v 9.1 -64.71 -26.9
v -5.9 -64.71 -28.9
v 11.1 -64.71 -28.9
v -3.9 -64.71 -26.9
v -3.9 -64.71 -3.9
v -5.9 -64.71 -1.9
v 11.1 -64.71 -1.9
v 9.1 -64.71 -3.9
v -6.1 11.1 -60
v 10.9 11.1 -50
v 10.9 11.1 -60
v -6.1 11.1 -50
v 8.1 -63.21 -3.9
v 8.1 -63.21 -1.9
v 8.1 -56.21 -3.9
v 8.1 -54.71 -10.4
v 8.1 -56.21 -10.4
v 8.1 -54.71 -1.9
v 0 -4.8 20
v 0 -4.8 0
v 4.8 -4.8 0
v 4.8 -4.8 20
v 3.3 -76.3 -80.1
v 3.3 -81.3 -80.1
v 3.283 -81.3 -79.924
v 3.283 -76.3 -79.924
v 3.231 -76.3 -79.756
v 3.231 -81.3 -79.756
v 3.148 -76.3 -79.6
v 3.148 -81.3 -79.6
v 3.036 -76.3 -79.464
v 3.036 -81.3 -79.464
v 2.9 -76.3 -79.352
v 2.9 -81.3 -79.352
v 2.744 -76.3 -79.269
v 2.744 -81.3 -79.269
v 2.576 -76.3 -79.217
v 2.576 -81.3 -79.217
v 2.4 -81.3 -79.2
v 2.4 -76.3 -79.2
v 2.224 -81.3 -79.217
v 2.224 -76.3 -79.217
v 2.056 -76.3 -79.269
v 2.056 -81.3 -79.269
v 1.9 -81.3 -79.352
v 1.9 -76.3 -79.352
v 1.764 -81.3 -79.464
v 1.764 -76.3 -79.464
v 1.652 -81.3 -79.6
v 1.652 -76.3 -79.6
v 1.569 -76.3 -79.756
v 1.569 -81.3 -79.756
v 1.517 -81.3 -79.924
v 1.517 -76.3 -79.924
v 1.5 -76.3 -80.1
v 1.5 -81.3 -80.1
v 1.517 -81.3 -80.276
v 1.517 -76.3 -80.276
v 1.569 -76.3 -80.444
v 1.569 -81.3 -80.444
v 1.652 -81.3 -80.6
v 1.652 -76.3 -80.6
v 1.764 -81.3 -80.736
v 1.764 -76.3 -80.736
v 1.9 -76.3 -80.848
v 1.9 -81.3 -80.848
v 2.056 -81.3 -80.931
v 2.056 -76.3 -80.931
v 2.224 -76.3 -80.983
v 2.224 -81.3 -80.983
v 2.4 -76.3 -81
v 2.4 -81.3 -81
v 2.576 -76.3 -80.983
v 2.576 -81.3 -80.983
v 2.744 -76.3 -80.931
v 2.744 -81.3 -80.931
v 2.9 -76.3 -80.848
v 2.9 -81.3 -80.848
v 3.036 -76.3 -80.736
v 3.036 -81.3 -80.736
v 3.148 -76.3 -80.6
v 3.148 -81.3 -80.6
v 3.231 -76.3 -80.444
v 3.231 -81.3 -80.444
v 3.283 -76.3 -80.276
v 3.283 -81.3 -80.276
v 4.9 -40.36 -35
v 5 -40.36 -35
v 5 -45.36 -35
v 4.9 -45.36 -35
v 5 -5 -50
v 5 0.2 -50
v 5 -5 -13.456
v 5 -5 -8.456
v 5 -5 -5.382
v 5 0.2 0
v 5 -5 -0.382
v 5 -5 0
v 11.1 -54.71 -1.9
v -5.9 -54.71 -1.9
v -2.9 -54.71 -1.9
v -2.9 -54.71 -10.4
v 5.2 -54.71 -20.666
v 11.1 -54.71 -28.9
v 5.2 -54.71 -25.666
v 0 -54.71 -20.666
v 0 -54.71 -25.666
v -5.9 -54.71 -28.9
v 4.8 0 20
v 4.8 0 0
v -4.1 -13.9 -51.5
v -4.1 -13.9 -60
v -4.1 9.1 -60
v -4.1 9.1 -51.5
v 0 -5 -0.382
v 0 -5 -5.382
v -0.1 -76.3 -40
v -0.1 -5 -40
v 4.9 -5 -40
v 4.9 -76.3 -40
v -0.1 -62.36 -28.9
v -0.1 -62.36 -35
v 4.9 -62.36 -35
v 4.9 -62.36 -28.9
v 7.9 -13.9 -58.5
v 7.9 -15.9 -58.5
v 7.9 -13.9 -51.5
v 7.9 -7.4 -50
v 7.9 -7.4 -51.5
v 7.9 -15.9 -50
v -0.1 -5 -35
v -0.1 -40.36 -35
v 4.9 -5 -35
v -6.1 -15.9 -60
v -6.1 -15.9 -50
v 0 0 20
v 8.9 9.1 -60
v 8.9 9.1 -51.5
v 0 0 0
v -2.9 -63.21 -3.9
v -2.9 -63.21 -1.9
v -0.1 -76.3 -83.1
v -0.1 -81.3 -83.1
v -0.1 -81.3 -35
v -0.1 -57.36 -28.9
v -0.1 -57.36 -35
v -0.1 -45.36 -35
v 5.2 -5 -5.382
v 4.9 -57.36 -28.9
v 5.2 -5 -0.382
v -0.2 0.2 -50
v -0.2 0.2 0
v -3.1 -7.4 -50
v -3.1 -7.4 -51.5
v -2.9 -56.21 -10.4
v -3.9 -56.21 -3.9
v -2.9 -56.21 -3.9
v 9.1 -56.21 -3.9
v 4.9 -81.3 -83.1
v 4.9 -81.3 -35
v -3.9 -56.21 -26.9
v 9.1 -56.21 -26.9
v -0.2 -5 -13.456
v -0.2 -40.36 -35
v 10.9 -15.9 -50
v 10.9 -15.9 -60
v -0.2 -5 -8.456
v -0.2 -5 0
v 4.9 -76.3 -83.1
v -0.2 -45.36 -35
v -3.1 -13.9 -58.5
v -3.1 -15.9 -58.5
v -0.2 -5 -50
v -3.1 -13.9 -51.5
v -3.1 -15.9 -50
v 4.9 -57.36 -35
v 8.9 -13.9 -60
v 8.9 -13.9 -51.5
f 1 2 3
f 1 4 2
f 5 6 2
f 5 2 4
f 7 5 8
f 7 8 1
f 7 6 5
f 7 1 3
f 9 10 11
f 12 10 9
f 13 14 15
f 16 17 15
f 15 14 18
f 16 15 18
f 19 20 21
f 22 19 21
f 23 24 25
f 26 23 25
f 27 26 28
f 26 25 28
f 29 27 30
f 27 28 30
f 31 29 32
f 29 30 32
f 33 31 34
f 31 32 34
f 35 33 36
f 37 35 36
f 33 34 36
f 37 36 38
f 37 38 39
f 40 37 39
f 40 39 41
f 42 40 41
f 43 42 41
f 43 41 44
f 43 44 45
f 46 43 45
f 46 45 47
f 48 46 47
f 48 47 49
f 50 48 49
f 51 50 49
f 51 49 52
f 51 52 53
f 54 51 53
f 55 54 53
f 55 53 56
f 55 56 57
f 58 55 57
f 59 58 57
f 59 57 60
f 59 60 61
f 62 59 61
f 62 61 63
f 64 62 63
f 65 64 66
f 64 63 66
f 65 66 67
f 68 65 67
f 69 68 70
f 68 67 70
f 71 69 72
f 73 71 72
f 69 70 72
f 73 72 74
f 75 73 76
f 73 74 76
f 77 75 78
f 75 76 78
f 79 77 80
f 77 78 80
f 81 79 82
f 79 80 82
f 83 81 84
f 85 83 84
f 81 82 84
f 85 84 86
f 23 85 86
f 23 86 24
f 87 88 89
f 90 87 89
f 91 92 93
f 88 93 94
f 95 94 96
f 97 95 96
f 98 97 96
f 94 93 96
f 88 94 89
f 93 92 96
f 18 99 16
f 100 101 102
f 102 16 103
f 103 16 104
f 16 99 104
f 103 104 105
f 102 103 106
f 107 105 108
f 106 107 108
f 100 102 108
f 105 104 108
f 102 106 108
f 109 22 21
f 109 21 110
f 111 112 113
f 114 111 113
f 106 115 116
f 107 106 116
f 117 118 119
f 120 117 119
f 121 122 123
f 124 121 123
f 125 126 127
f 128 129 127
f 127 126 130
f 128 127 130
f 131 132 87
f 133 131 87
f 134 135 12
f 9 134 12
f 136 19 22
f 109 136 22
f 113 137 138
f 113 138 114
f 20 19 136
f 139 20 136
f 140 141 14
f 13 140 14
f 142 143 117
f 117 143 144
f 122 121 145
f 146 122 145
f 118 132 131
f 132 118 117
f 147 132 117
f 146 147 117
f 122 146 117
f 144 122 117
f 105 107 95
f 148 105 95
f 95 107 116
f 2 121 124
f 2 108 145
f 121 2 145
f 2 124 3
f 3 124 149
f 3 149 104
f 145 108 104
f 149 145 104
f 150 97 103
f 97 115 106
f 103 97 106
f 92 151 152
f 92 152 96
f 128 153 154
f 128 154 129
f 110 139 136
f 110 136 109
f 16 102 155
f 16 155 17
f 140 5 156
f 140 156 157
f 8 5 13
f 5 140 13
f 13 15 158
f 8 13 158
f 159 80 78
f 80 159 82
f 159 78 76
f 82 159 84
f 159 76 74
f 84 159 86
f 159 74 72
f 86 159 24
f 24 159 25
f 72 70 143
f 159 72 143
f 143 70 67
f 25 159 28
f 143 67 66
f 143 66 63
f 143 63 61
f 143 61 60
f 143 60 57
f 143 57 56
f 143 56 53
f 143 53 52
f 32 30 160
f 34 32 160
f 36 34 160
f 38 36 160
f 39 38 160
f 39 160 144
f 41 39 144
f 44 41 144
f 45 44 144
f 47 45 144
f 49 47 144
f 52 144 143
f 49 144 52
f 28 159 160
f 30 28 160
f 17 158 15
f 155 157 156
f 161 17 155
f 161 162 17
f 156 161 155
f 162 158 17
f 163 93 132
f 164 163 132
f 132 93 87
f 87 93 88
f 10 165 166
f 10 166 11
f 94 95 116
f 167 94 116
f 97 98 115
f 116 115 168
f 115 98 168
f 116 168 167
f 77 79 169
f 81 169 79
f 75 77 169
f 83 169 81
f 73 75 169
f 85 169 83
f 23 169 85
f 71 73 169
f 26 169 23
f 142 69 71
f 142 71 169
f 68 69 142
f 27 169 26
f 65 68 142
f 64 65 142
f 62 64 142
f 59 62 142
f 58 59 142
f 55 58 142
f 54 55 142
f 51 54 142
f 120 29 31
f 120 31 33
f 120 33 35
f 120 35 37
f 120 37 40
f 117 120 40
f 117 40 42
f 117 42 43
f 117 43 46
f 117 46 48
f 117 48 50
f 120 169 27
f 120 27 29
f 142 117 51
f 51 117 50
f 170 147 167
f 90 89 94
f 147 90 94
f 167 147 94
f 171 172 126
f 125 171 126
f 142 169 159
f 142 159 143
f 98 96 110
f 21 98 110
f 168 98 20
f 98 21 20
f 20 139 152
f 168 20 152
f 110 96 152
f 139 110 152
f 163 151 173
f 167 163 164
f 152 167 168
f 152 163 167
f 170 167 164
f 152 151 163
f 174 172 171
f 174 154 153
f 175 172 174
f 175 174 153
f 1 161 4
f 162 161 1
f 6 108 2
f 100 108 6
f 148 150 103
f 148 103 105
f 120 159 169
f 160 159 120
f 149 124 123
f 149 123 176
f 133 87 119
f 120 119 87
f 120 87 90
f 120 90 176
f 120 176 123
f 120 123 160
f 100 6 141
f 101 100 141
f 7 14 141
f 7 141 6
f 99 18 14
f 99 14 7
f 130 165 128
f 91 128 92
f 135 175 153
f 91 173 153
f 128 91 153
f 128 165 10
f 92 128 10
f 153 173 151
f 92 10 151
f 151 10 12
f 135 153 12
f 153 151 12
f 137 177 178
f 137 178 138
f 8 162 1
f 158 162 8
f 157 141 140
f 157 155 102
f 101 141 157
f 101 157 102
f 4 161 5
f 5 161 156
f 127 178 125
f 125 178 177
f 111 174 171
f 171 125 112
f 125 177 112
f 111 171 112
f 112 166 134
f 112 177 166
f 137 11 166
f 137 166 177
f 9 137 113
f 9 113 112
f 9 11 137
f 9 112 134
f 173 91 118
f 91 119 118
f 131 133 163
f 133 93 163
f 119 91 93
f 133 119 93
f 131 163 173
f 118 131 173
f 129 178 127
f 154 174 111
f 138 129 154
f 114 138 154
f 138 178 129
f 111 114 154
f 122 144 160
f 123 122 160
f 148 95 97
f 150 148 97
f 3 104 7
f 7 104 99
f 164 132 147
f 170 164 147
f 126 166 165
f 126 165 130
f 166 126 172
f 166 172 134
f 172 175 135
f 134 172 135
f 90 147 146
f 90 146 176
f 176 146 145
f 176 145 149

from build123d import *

# Parameters (mm, degrees)
SKETCH1_W            = 4.8
SKETCH1_H            = 4.8
BOSS_EXTRUDE1_DEPTH  = 20
SKETCH2_W            = 5.2
SKETCH2_H            = 5.2
BOSS_EXTRUDE2_DEPTH  = 50
SKETCH3_W            = 17
SKETCH3_H            = 27
BOSS_EXTRUDE3_DEPTH  = 10
SKETCH4_W            = 13
SKETCH4_H            = 23
CUT_EXTRUDE1_DEPTH   = 8.5
SKETCH5_W            = 11
SKETCH5_H            = 8.5
CUT_EXTRUDE2_DEPTH   = 8.5
SKETCH6_W            = 5
SKETCH6_H            = 5
BOSS_EXTRUDE4_DEPTH  = 81.5
SKETCH7_W            = 5
SKETCH7_H            = 5
BOSS_EXTRUDE5_DEPTH  = 43.1
SKETCH9_R            = 0.9
CUT_EXTRUDE4_DEPTH   = 125.748466924
BOSS_EXTRUDE6_DEPTH  = 5.2
SKETCH13_W           = 17
SKETCH13_H           = 27
BOSS_EXTRUDE7_DEPTH  = 1.5
SKETCH14_W           = 17
SKETCH14_H           = 27
SKETCH14_W_2         = 13
SKETCH14_H_2         = 23
BOSS_EXTRUDE8_DEPTH  = 8.5
SKETCH15_W           = 11
SKETCH15_H           = 8.5
CUT_EXTRUDE6_DEPTH   = 8.5
BOSS_EXTRUDE9_REACH  = 100.782
SKETCH16_W           = 5
SKETCH16_H           = 5
BOSS_EXTRUDE10_DEPTH = 5.2


with BuildPart() as part:
    # Sketch1 → Boss-Extrude1 (new body)
    with BuildSketch(Plane.XY):
        with Locations((2.4, -2.4)):
            Rectangle(SKETCH1_W, SKETCH1_H)
    extrude(amount=BOSS_EXTRUDE1_DEPTH)

    # Sketch2 → Boss-Extrude2 (add)
    with BuildSketch(Plane(origin=(0, 0, 0), x_dir=(-1, 0, 0), z_dir=(0, 0, -1))):
        with Locations((-2.4, -2.4)):
            Rectangle(SKETCH2_W, SKETCH2_H)
    extrude(amount=BOSS_EXTRUDE2_DEPTH)

    # Sketch3 → Boss-Extrude3 (add)
    with BuildSketch(Plane(origin=(0, 0, -50), x_dir=(-1, 0, 0), z_dir=(0, 0, -1))):
        with Locations((-2.4, -2.4)):
            Rectangle(SKETCH3_W, SKETCH3_H)
    extrude(amount=BOSS_EXTRUDE3_DEPTH)

    # Sketch4 → Cut-Extrude1 (cut)
    with BuildSketch(Plane(origin=(0, 0, -60), x_dir=(-1, 0, 0), z_dir=(0, 0, -1))):
        with Locations((-2.4, -2.4)):
            Rectangle(SKETCH4_W, SKETCH4_H)
    extrude(amount=-CUT_EXTRUDE1_DEPTH, mode=Mode.SUBTRACT)

    # Sketch5 → Cut-Extrude2 (cut)
    with BuildSketch(Plane.XZ.offset(15.9)):
        with Locations((2.4, -54.25)):
            Rectangle(SKETCH5_W, SKETCH5_H)
    extrude(amount=-CUT_EXTRUDE2_DEPTH, mode=Mode.SUBTRACT)

    # Sketch6 → Boss-Extrude4 (add)
    with BuildSketch(Plane(origin=(0, 0.2, 0), x_dir=(1, 0, 0), z_dir=(0, 1, 0))):
        with Locations((2.4, 37.5)):
            Rectangle(SKETCH6_W, SKETCH6_H)
    extrude(amount=-BOSS_EXTRUDE4_DEPTH)

    # Sketch7 → Boss-Extrude5 (add)
    with BuildSketch(Plane(origin=(0, 0, -40), x_dir=(-1, 0, 0), z_dir=(0, 0, -1))):
        with Locations((-2.4, -78.8)):
            Rectangle(SKETCH7_W, SKETCH7_H)
    extrude(amount=BOSS_EXTRUDE5_DEPTH)

    # Sketch9 → Cut-Extrude4 (cut, through all)
    with BuildSketch(Plane.XZ.offset(81.3)):
        with Locations((2.4, -80.1)):
            Circle(SKETCH9_R)
    extrude(amount=-CUT_EXTRUDE4_DEPTH, mode=Mode.SUBTRACT)

    # Sketch12 → Boss-Extrude6 (add)
    with BuildSketch(Plane(origin=(5, 0, 0), x_dir=(0, 0, -1), z_dir=(1, 0, 0))):
        Polygon((13.455782968, -5), (35, -40.359932103), (35, -45.359932103), (8.455782968, -5), align=None)
    extrude(amount=-BOSS_EXTRUDE6_DEPTH)


with BuildPart() as body_2:
    # Sketch13 → Boss-Extrude7 (new body)
    with BuildSketch(Plane(origin=(0, -54.71, 0), x_dir=(-1, 0, 0), z_dir=(0, -1, 0))):
        with Locations((-2.6, 15.4)):
            Rectangle(SKETCH13_W, SKETCH13_H)
    extrude(amount=BOSS_EXTRUDE7_DEPTH)

    # Sketch14 → Boss-Extrude8 (add)
    with BuildSketch(Plane.XZ.offset(56.21)):
        with Locations((2.6, -15.4)):
            Rectangle(SKETCH14_W, SKETCH14_H)
        with Locations((2.6, -15.4)):
            Rectangle(SKETCH14_W_2, SKETCH14_H_2, mode=Mode.SUBTRACT)
    extrude(amount=BOSS_EXTRUDE8_DEPTH)

    # Sketch15 → Cut-Extrude6 (cut)
    with BuildSketch(Plane.XY.offset(-1.9)):
        with Locations((2.6, -58.96)):
            Rectangle(SKETCH15_W, SKETCH15_H)
    extrude(amount=-CUT_EXTRUDE6_DEPTH, mode=Mode.SUBTRACT)

    # Sketch16 → Boss-Extrude9 (add, up to next)
    with BuildSketch(Plane.XY.offset(-35), mode=Mode.PRIVATE) as boss_extrude9_sk1:
        with Locations((2.4, -59.859932103)):
            Rectangle(SKETCH16_W, SKETCH16_H)
    boss_extrude9_tool1 = extrude(boss_extrude9_sk1.sketch, amount=BOSS_EXTRUDE9_REACH, mode=Mode.PRIVATE) - body_2.part

    add(part.part)  # Boss-Extrude9 merges part
    add(boss_extrude9_tool1.solids().sort_by_distance((2.4, -59.859932, -35))[0])

    # Sketch18 → Boss-Extrude10 (add)
    with BuildSketch(Plane(origin=(0, 0, 0), x_dir=(0, 0, -1), z_dir=(1, 0, 0))):
        Polygon((25.666047821, -54.71), (5.38231876, -5), (0.38231876, -5), (20.666047821, -54.71), align=None)
    extrude(amount=BOSS_EXTRUDE10_DEPTH)


solid = body_2.part
